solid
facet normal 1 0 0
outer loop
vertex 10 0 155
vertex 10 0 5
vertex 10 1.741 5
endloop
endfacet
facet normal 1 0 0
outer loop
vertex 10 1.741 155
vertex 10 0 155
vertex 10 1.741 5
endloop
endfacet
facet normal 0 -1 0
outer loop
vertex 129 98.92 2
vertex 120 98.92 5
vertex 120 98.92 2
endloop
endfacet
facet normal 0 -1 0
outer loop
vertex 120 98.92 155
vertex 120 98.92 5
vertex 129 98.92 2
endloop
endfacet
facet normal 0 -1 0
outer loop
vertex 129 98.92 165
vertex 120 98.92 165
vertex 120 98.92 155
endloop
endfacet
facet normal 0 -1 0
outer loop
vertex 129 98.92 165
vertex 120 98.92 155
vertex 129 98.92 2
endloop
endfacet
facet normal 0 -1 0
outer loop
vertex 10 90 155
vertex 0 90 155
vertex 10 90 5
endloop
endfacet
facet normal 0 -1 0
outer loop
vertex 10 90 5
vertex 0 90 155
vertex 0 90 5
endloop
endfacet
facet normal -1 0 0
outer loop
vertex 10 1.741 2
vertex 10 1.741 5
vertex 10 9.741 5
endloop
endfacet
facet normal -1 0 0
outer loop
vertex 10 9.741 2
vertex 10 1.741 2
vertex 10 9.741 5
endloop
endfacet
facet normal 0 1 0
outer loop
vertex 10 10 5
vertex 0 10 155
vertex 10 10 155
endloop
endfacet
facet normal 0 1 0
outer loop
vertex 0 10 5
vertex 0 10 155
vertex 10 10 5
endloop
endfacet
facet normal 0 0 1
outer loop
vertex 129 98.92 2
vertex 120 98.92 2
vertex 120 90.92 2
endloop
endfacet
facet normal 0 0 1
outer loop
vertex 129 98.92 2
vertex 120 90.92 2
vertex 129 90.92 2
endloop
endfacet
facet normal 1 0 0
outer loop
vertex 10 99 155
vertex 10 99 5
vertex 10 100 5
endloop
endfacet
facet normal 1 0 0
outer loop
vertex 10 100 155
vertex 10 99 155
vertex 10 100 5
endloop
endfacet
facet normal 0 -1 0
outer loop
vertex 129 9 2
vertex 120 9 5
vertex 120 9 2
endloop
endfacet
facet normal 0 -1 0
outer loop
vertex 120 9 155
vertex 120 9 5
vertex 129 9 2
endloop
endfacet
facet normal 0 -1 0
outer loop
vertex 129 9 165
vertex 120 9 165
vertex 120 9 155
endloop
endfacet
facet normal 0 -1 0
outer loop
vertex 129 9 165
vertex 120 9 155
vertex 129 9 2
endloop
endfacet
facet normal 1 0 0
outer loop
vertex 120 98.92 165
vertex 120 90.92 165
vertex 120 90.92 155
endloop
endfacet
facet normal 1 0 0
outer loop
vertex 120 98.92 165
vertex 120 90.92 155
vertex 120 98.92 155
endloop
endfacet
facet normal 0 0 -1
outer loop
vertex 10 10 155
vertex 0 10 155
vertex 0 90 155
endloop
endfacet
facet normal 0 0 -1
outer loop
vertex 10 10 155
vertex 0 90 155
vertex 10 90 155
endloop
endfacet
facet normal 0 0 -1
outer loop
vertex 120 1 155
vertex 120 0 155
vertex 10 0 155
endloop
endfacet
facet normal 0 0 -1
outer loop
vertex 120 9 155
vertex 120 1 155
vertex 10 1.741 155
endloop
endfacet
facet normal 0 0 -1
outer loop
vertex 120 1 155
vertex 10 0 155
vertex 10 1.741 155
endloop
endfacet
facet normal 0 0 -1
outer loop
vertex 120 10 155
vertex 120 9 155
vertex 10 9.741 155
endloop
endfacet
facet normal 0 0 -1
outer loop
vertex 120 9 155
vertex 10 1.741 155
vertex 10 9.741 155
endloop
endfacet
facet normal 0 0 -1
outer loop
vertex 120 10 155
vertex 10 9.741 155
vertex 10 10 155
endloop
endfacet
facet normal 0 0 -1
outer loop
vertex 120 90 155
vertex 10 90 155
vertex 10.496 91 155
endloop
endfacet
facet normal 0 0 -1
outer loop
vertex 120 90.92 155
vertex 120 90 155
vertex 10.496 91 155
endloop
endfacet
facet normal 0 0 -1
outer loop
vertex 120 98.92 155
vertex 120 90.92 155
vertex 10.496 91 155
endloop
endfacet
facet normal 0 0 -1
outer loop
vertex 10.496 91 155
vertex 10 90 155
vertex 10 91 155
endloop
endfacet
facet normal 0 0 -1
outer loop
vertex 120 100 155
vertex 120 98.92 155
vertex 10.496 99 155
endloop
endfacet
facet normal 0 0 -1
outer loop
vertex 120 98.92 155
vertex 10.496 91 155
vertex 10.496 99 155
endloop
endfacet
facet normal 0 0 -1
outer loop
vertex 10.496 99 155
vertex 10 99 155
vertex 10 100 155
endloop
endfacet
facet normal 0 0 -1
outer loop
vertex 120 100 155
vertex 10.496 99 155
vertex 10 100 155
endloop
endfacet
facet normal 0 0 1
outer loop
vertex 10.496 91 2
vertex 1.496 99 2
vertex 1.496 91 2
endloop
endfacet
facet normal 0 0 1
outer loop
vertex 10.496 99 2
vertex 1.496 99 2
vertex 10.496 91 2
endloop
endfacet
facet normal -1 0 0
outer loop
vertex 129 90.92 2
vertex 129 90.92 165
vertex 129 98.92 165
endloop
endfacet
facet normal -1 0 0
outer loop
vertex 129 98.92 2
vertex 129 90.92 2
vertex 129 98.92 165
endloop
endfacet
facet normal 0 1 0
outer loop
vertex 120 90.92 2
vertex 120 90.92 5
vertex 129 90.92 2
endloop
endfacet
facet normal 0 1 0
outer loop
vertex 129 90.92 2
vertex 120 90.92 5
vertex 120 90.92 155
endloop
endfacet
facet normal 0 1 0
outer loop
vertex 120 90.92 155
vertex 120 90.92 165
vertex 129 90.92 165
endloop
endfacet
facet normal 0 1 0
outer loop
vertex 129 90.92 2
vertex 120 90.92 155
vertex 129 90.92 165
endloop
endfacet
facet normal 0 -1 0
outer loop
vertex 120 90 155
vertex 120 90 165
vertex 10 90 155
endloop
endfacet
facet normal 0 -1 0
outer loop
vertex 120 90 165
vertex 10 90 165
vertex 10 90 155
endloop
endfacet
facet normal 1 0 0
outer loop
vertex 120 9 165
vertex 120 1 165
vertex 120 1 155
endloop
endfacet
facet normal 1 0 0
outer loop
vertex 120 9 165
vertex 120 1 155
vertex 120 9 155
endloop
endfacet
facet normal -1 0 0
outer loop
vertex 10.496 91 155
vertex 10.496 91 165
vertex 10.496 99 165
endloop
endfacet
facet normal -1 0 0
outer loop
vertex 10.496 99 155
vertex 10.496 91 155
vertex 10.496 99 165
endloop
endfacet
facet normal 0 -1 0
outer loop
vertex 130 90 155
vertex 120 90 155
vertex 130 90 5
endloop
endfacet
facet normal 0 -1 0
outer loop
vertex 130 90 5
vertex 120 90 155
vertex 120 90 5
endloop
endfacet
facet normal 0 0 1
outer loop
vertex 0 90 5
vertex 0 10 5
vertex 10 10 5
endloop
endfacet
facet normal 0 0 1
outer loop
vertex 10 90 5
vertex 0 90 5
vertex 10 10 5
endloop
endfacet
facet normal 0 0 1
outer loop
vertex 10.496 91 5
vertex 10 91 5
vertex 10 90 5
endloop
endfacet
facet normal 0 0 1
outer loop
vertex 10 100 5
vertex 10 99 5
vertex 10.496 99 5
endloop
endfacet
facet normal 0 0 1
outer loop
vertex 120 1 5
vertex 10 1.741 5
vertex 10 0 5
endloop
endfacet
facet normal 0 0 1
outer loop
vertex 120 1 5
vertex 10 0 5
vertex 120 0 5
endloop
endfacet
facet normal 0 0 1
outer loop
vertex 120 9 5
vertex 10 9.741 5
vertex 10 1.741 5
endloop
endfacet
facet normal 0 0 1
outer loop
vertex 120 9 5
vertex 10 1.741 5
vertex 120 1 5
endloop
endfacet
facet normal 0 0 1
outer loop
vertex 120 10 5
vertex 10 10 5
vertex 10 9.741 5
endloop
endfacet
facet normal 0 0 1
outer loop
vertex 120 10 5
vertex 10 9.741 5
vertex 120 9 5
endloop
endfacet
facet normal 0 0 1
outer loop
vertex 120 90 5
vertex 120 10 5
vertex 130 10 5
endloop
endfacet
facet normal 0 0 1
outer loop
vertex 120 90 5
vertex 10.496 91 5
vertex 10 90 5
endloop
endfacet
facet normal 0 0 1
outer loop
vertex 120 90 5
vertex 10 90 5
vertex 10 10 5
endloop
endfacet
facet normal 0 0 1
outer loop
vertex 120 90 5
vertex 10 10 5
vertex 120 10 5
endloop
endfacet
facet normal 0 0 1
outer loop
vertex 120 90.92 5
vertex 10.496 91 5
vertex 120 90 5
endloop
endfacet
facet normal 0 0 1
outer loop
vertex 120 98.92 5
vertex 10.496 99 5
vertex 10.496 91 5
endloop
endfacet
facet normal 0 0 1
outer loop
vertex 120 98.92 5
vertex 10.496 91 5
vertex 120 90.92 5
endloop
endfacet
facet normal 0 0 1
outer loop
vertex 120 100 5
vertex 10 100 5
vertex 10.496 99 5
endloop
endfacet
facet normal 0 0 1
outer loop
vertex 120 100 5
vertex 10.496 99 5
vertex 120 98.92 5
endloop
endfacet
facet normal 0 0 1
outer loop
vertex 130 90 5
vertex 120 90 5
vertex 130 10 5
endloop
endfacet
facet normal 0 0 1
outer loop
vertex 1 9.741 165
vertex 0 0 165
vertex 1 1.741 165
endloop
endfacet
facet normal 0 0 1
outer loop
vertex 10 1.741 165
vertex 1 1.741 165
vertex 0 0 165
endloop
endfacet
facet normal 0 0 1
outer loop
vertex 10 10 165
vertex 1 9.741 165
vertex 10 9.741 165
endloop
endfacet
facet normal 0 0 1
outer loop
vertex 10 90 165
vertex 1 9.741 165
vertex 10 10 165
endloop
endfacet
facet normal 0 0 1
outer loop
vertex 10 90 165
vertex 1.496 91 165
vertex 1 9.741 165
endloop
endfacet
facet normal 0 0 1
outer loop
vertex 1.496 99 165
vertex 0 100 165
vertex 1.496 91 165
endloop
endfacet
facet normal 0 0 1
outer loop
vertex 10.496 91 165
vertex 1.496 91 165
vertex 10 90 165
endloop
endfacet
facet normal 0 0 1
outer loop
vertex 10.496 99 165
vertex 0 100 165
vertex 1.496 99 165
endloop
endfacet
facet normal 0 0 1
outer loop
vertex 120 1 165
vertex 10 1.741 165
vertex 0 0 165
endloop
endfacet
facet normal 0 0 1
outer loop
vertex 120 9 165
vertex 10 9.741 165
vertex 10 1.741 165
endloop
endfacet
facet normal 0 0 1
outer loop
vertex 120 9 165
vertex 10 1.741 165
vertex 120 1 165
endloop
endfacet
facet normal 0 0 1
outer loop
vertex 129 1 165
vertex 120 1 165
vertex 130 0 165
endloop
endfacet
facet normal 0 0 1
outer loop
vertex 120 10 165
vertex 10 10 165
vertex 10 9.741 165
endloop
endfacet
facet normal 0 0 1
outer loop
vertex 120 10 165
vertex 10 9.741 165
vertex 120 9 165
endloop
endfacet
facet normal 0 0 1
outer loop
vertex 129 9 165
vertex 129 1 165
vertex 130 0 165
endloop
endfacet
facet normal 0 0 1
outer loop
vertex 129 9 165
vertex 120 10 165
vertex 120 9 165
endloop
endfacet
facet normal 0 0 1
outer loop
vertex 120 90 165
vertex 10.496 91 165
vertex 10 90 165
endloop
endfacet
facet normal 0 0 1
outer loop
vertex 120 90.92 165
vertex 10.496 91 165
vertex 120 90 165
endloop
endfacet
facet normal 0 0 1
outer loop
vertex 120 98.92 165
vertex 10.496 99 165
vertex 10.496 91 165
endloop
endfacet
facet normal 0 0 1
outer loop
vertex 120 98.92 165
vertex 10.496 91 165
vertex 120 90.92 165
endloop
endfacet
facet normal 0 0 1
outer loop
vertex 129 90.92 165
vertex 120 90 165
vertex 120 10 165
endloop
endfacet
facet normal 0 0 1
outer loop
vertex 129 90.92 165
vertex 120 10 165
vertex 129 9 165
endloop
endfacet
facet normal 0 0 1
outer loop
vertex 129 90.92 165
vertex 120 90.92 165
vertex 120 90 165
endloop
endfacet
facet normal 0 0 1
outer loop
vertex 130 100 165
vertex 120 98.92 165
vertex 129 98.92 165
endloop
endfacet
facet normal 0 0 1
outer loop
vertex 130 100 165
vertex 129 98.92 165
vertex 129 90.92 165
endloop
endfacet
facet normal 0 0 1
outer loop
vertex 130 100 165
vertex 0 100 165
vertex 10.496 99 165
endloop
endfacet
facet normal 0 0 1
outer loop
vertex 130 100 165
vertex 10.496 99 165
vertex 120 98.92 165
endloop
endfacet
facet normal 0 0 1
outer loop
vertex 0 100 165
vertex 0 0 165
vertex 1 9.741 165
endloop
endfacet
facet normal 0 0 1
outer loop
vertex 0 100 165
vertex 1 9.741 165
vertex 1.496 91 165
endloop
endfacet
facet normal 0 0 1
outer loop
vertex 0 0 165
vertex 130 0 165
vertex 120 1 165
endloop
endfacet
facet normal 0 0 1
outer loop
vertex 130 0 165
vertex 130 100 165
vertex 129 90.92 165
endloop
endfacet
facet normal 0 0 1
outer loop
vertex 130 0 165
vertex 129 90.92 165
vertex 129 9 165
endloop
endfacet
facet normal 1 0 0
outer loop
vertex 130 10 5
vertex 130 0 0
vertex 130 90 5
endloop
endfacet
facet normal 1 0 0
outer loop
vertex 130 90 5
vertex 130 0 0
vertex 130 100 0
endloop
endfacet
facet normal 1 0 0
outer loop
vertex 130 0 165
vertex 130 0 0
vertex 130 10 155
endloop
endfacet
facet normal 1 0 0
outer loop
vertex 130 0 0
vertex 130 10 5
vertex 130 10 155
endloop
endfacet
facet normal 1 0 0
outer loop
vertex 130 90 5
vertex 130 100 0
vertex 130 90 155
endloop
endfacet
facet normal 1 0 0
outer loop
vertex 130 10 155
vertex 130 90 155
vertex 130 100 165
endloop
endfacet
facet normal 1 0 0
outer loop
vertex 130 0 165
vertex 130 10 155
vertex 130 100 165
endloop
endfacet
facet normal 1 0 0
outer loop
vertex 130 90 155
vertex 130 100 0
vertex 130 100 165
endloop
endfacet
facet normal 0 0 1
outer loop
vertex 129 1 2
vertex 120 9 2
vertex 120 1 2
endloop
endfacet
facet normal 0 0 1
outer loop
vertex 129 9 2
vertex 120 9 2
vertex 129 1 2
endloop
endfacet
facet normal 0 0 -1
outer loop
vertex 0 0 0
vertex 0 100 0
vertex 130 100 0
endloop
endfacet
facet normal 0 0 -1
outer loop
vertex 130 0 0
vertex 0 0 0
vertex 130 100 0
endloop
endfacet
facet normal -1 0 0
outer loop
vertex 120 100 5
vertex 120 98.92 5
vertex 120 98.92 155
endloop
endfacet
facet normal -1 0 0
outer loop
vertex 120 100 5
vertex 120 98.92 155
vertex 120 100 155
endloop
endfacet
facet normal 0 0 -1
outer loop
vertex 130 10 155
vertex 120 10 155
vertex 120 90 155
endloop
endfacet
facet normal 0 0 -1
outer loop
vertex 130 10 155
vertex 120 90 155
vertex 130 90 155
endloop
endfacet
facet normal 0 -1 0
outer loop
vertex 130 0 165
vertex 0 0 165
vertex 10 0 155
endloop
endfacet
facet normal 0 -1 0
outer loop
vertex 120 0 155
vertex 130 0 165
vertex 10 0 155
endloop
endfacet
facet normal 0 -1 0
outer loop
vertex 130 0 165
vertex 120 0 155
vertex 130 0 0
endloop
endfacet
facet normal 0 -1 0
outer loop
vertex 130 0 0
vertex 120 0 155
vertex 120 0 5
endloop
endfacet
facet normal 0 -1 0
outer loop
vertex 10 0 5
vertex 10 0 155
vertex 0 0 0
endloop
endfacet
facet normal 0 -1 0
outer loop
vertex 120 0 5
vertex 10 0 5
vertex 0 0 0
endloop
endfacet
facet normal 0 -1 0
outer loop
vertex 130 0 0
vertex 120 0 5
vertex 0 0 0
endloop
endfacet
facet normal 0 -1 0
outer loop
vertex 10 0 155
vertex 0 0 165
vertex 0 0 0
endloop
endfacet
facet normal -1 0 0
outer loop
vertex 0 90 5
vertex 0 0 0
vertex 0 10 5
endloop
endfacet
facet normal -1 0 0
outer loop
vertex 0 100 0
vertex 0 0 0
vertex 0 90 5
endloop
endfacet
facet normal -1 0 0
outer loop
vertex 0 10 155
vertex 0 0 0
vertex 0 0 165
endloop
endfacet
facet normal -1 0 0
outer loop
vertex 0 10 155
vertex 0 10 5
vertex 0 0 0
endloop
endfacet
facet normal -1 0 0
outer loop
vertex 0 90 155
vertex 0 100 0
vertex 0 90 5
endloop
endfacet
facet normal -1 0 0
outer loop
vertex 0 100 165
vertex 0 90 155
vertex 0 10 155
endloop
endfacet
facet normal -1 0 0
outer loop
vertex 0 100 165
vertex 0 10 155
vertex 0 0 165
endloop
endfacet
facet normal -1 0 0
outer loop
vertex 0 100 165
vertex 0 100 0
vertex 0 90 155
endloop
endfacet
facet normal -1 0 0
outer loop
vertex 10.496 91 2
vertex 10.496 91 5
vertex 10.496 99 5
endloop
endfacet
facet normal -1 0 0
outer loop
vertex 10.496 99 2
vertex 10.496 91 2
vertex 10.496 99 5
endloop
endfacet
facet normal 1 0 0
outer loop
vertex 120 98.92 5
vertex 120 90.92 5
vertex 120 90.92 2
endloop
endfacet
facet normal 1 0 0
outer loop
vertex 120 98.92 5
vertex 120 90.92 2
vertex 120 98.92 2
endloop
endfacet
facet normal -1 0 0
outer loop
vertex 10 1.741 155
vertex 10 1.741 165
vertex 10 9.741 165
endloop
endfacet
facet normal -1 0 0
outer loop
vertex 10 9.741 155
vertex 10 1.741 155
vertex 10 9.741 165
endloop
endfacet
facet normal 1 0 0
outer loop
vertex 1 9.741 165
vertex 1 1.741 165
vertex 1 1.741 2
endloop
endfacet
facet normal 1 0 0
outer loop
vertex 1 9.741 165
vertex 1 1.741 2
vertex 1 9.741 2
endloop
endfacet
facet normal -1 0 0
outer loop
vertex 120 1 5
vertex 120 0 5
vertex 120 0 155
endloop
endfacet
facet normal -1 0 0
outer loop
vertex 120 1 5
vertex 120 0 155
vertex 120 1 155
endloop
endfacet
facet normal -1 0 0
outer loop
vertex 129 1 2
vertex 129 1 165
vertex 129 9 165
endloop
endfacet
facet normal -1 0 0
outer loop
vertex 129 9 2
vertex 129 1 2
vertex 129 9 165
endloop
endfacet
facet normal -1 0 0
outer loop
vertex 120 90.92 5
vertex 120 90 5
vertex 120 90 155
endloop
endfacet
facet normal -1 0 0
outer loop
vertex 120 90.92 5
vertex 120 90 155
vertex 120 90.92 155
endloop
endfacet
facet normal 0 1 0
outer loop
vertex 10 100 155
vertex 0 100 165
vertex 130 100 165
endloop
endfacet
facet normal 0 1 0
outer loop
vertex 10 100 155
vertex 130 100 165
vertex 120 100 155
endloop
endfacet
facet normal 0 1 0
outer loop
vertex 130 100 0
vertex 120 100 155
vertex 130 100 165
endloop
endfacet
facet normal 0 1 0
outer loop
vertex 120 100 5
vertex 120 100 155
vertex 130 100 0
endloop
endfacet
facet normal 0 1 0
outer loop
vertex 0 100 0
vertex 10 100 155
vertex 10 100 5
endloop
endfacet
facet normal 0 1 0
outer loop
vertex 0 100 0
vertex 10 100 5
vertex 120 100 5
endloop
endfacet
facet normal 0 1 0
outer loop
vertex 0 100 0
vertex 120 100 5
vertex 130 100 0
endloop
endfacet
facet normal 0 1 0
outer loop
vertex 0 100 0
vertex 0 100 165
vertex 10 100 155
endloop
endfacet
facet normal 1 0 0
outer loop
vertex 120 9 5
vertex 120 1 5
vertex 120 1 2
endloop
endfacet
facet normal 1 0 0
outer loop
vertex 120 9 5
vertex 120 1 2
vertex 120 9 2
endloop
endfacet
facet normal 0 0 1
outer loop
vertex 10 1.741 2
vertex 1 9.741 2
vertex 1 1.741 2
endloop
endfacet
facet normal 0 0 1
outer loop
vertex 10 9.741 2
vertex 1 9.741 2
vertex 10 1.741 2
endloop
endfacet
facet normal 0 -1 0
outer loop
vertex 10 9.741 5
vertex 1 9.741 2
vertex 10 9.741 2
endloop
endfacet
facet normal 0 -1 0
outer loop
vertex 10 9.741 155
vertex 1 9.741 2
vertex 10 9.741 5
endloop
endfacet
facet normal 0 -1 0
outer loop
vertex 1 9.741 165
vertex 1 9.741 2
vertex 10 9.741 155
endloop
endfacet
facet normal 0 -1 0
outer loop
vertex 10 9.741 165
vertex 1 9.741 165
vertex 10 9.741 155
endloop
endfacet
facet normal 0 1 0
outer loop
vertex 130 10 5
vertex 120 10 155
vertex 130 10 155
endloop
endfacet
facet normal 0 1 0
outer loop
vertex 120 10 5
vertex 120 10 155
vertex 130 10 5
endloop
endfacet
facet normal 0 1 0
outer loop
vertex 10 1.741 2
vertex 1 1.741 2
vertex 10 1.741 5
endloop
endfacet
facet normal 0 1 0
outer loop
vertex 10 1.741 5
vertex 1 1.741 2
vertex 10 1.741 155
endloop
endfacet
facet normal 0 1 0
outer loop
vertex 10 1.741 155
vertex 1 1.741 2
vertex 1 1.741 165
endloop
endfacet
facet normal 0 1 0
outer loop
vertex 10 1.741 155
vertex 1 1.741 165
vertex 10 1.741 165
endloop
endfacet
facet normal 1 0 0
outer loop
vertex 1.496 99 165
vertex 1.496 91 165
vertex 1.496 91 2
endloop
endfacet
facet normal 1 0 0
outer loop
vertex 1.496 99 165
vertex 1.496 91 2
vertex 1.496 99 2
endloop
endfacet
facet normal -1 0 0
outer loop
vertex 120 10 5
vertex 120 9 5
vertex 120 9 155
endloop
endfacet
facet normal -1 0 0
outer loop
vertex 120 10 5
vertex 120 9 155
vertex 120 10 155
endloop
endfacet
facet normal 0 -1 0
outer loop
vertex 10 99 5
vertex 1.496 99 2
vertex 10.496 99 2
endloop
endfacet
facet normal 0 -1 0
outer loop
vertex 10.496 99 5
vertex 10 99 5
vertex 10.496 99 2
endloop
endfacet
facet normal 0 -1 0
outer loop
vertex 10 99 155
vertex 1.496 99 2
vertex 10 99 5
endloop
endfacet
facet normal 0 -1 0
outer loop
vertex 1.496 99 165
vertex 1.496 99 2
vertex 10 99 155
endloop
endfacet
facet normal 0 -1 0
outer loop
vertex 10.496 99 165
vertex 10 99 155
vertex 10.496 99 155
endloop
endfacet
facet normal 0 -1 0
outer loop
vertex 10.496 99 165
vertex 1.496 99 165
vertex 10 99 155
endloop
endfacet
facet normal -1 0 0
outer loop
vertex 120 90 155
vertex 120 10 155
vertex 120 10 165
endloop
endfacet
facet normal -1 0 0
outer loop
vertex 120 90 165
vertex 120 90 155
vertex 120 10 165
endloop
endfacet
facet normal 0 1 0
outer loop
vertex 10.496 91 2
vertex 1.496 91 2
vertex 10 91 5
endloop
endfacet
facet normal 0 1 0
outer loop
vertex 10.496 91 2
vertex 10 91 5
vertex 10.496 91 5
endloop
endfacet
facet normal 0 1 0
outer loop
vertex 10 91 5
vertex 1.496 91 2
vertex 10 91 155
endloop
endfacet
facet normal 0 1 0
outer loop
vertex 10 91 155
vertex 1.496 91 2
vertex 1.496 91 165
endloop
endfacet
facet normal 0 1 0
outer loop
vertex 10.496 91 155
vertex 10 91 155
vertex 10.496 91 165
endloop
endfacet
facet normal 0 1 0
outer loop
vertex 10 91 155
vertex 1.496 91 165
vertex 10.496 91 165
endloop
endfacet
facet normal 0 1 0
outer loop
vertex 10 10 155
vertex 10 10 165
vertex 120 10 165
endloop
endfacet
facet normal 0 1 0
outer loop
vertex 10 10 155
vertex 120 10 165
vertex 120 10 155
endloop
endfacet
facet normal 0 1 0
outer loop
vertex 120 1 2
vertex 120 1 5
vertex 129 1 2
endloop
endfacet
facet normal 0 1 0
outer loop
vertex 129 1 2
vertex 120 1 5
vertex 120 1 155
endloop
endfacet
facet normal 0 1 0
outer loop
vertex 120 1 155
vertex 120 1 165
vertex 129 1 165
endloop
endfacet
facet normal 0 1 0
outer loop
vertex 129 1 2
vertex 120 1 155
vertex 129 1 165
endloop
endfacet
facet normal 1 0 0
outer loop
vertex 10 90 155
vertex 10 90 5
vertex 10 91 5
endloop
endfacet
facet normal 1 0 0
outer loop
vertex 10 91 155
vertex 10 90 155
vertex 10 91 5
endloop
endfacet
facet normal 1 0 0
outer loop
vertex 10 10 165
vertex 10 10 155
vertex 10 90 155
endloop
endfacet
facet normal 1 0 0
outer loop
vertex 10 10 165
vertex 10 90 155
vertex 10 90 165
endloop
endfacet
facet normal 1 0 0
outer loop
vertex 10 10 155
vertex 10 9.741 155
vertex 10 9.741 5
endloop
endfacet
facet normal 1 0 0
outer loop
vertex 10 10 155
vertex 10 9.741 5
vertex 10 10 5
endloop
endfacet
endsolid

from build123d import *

# Parameters (mm, degrees)
SKETCH1_W           = 130
SKETCH1_H           = 100
BOSS_EXTRUDE1_DEPTH = 5
SKETCH2_W           = 10
SKETCH2_H           = 10
BOSS_EXTRUDE2_DEPTH = 160
SKETCH3_W           = 10
SKETCH3_H           = 10
BOSS_EXTRUDE3_DEPTH = 110
SKETCH4_W           = 10
SKETCH4_H           = 10
BOSS_EXTRUDE4_DEPTH = 110
SKETCH5_W           = 10
SKETCH5_H           = 10
BOSS_EXTRUDE5_DEPTH = 80
SKETCH6_W           = 10
SKETCH6_H           = 10
BOSS_EXTRUDE6_DEPTH = 80
SKETCH9_W           = 9
SKETCH9_H           = 8
CUT_EXTRUDE4_DEPTH  = 163


with BuildPart() as part:
    # Sketch1 → Boss-Extrude1 (new body)
    with BuildSketch(Plane.XY):
        with Locations((65, 50)):
            Rectangle(SKETCH1_W, SKETCH1_H)
    extrude(amount=BOSS_EXTRUDE1_DEPTH)

    # Sketch2 → Boss-Extrude2 (add)
    with BuildSketch(Plane.XY.offset(5)):
        with Locations((5, 95)):
            Rectangle(SKETCH2_W, SKETCH2_H)
        with Locations((125, 95)):
            Rectangle(SKETCH2_W, SKETCH2_H)
        with Locations((5, 5)):
            Rectangle(SKETCH2_W, SKETCH2_H)
        with Locations((125, 5)):
            Rectangle(SKETCH2_W, SKETCH2_H)
    extrude(amount=BOSS_EXTRUDE2_DEPTH)

    # Sketch3 → Boss-Extrude3 (add)
    with BuildSketch(Plane(origin=(10, 0, 0), x_dir=(0, 0, -1), z_dir=(1, 0, 0))):
        with Locations((-160, 5)):
            Rectangle(SKETCH3_W, SKETCH3_H)
    extrude(amount=BOSS_EXTRUDE3_DEPTH)

    # Sketch4 → Boss-Extrude4 (add)
    with BuildSketch(Plane(origin=(10, 0, 0), x_dir=(0, 0, -1), z_dir=(1, 0, 0))):
        with Locations((-160, 95)):
            Rectangle(SKETCH4_W, SKETCH4_H)
    extrude(amount=BOSS_EXTRUDE4_DEPTH)

    # Sketch5 → Boss-Extrude5 (add)
    with BuildSketch(Plane.XZ.offset(-90)):
        with Locations((5, 160)):
            Rectangle(SKETCH5_W, SKETCH5_H)
    extrude(amount=BOSS_EXTRUDE5_DEPTH)

    # Sketch6 → Boss-Extrude6 (add)
    with BuildSketch(Plane.XZ.offset(-90)):
        with Locations((125, 160)):
            Rectangle(SKETCH6_W, SKETCH6_H)
    extrude(amount=BOSS_EXTRUDE6_DEPTH)

    # Sketch9 → Cut-Extrude4 (cut)
    with BuildSketch(Plane.XY.offset(165)):
        with Locations((124.5, 94.920029207)):
            Rectangle(SKETCH9_W, SKETCH9_H)
        with Locations((124.5, 5)):
            Rectangle(SKETCH9_W, SKETCH9_H)
        with Locations((5.5, 5.741486023)):
            Rectangle(SKETCH9_W, SKETCH9_H)
        with Locations((5.995524186, 95)):
            Rectangle(SKETCH9_W, SKETCH9_H)
    extrude(amount=-CUT_EXTRUDE4_DEPTH, mode=Mode.SUBTRACT)


solid = part.part
